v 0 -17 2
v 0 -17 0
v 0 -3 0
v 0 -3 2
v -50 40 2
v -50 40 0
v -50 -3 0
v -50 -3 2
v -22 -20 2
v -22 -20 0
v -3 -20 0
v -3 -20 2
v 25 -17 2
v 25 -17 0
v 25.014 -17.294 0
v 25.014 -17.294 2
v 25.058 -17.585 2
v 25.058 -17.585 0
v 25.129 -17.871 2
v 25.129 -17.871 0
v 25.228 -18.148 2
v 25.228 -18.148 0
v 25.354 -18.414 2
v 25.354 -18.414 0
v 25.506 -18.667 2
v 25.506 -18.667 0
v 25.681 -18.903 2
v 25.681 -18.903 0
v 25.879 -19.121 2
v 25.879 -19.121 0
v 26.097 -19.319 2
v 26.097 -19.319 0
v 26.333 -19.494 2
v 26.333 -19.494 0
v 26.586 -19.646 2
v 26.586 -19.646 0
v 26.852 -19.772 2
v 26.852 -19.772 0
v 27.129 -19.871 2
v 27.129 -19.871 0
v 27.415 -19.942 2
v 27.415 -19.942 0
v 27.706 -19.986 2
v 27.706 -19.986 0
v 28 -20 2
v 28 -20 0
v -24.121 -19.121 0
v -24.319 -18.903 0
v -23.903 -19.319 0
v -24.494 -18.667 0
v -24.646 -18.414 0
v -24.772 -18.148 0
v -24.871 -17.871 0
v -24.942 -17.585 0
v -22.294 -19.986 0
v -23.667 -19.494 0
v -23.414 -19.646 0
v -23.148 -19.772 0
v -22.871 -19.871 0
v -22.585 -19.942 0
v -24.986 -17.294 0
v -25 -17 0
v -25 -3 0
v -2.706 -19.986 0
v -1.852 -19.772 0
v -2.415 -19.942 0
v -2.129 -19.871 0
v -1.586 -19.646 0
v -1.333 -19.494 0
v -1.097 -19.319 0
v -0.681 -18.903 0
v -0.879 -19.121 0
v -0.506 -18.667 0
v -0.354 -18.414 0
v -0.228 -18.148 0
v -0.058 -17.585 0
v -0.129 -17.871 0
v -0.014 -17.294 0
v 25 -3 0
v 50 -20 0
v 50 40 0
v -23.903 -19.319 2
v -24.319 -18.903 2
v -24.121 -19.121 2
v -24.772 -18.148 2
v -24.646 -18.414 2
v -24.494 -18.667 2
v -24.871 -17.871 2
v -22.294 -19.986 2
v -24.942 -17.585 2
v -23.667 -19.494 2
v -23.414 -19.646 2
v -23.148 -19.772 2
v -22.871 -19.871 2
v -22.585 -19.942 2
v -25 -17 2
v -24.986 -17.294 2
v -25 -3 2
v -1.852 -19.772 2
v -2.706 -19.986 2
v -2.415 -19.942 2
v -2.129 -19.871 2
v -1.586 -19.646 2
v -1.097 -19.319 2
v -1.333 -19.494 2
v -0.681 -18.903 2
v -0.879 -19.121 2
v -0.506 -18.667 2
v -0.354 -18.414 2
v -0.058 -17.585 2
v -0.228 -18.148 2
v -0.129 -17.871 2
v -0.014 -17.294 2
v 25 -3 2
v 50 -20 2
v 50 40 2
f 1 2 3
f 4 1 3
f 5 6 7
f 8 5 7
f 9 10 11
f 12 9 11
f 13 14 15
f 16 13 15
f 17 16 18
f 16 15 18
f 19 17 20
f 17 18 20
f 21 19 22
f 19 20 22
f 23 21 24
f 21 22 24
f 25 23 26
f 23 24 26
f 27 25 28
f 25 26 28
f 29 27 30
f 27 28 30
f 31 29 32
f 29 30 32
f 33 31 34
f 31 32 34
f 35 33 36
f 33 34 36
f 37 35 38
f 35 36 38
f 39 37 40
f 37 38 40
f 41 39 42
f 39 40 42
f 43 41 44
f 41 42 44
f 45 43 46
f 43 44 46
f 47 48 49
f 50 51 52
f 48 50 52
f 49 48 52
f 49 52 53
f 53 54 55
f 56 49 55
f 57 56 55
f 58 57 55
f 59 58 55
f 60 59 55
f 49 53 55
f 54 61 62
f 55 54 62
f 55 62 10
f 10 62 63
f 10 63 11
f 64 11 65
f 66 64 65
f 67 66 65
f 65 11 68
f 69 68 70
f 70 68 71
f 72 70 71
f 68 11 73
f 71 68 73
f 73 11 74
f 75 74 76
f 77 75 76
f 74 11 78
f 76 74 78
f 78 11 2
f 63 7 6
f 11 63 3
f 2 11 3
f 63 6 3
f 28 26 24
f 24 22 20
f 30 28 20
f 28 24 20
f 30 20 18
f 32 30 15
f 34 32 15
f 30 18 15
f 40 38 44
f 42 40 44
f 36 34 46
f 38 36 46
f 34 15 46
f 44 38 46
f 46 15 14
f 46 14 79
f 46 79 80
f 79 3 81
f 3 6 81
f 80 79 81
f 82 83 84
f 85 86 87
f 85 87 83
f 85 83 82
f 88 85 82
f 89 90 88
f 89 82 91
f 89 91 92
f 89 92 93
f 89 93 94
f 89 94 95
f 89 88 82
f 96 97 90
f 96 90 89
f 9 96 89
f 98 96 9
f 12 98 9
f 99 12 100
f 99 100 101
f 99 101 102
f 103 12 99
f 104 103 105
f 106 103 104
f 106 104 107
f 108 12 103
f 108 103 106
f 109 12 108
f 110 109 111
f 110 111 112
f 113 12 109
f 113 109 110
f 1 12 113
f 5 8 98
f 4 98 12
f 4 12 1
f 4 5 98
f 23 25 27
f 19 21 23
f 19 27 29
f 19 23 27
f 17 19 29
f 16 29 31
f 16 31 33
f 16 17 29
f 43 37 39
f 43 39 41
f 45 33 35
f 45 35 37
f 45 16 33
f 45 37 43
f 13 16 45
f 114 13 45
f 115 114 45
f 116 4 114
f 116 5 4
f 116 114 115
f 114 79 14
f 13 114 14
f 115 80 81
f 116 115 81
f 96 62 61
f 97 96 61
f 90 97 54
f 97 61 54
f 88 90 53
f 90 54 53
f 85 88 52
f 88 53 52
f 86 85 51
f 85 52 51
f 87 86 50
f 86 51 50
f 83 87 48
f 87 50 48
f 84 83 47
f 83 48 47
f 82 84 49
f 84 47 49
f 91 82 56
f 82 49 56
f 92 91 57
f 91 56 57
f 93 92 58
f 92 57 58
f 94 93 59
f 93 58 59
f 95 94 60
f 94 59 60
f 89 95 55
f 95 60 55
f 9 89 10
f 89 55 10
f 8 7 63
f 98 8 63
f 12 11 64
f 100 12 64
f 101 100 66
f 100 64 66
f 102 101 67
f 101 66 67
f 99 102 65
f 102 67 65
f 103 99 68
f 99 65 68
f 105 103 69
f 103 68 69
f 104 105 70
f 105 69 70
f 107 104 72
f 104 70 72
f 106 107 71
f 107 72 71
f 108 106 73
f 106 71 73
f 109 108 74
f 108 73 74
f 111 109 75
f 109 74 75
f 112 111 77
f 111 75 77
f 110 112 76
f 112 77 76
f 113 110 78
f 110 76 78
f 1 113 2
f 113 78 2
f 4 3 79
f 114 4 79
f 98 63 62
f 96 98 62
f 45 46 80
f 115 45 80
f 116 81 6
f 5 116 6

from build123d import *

# Parameters (mm, degrees)
BOSS_EXTRUDE1_DEPTH = 2


with BuildPart() as part:
    # Sketch1 → Boss-Extrude1 (new body)
    with BuildSketch(Plane.XY):
        with BuildLine():
            Line((0, -3), (25, -3))
            Line((25, -3), (25, -17))
            ThreePointArc((25, -17), (25.878679656, -19.121320344), (28, -20))
            Line((28, -20), (50, -20))
            Line((50, -20), (50, 40))
            Line((50, 40), (-50, 40))
            Line((-50, 40), (-50, -3))
            Line((-50, -3), (-25, -3))
            Line((-25, -3), (-25, -17))
            ThreePointArc((-25, -17), (-24.121320344, -19.121320344), (-22, -20))
            Line((-22, -20), (-3, -20))
            ThreePointArc((-3, -20), (-0.878679656, -19.121320344), (0, -17))
            Line((0, -17), (0, -3))
        make_face()
    extrude(amount=BOSS_EXTRUDE1_DEPTH)


solid = part.part
